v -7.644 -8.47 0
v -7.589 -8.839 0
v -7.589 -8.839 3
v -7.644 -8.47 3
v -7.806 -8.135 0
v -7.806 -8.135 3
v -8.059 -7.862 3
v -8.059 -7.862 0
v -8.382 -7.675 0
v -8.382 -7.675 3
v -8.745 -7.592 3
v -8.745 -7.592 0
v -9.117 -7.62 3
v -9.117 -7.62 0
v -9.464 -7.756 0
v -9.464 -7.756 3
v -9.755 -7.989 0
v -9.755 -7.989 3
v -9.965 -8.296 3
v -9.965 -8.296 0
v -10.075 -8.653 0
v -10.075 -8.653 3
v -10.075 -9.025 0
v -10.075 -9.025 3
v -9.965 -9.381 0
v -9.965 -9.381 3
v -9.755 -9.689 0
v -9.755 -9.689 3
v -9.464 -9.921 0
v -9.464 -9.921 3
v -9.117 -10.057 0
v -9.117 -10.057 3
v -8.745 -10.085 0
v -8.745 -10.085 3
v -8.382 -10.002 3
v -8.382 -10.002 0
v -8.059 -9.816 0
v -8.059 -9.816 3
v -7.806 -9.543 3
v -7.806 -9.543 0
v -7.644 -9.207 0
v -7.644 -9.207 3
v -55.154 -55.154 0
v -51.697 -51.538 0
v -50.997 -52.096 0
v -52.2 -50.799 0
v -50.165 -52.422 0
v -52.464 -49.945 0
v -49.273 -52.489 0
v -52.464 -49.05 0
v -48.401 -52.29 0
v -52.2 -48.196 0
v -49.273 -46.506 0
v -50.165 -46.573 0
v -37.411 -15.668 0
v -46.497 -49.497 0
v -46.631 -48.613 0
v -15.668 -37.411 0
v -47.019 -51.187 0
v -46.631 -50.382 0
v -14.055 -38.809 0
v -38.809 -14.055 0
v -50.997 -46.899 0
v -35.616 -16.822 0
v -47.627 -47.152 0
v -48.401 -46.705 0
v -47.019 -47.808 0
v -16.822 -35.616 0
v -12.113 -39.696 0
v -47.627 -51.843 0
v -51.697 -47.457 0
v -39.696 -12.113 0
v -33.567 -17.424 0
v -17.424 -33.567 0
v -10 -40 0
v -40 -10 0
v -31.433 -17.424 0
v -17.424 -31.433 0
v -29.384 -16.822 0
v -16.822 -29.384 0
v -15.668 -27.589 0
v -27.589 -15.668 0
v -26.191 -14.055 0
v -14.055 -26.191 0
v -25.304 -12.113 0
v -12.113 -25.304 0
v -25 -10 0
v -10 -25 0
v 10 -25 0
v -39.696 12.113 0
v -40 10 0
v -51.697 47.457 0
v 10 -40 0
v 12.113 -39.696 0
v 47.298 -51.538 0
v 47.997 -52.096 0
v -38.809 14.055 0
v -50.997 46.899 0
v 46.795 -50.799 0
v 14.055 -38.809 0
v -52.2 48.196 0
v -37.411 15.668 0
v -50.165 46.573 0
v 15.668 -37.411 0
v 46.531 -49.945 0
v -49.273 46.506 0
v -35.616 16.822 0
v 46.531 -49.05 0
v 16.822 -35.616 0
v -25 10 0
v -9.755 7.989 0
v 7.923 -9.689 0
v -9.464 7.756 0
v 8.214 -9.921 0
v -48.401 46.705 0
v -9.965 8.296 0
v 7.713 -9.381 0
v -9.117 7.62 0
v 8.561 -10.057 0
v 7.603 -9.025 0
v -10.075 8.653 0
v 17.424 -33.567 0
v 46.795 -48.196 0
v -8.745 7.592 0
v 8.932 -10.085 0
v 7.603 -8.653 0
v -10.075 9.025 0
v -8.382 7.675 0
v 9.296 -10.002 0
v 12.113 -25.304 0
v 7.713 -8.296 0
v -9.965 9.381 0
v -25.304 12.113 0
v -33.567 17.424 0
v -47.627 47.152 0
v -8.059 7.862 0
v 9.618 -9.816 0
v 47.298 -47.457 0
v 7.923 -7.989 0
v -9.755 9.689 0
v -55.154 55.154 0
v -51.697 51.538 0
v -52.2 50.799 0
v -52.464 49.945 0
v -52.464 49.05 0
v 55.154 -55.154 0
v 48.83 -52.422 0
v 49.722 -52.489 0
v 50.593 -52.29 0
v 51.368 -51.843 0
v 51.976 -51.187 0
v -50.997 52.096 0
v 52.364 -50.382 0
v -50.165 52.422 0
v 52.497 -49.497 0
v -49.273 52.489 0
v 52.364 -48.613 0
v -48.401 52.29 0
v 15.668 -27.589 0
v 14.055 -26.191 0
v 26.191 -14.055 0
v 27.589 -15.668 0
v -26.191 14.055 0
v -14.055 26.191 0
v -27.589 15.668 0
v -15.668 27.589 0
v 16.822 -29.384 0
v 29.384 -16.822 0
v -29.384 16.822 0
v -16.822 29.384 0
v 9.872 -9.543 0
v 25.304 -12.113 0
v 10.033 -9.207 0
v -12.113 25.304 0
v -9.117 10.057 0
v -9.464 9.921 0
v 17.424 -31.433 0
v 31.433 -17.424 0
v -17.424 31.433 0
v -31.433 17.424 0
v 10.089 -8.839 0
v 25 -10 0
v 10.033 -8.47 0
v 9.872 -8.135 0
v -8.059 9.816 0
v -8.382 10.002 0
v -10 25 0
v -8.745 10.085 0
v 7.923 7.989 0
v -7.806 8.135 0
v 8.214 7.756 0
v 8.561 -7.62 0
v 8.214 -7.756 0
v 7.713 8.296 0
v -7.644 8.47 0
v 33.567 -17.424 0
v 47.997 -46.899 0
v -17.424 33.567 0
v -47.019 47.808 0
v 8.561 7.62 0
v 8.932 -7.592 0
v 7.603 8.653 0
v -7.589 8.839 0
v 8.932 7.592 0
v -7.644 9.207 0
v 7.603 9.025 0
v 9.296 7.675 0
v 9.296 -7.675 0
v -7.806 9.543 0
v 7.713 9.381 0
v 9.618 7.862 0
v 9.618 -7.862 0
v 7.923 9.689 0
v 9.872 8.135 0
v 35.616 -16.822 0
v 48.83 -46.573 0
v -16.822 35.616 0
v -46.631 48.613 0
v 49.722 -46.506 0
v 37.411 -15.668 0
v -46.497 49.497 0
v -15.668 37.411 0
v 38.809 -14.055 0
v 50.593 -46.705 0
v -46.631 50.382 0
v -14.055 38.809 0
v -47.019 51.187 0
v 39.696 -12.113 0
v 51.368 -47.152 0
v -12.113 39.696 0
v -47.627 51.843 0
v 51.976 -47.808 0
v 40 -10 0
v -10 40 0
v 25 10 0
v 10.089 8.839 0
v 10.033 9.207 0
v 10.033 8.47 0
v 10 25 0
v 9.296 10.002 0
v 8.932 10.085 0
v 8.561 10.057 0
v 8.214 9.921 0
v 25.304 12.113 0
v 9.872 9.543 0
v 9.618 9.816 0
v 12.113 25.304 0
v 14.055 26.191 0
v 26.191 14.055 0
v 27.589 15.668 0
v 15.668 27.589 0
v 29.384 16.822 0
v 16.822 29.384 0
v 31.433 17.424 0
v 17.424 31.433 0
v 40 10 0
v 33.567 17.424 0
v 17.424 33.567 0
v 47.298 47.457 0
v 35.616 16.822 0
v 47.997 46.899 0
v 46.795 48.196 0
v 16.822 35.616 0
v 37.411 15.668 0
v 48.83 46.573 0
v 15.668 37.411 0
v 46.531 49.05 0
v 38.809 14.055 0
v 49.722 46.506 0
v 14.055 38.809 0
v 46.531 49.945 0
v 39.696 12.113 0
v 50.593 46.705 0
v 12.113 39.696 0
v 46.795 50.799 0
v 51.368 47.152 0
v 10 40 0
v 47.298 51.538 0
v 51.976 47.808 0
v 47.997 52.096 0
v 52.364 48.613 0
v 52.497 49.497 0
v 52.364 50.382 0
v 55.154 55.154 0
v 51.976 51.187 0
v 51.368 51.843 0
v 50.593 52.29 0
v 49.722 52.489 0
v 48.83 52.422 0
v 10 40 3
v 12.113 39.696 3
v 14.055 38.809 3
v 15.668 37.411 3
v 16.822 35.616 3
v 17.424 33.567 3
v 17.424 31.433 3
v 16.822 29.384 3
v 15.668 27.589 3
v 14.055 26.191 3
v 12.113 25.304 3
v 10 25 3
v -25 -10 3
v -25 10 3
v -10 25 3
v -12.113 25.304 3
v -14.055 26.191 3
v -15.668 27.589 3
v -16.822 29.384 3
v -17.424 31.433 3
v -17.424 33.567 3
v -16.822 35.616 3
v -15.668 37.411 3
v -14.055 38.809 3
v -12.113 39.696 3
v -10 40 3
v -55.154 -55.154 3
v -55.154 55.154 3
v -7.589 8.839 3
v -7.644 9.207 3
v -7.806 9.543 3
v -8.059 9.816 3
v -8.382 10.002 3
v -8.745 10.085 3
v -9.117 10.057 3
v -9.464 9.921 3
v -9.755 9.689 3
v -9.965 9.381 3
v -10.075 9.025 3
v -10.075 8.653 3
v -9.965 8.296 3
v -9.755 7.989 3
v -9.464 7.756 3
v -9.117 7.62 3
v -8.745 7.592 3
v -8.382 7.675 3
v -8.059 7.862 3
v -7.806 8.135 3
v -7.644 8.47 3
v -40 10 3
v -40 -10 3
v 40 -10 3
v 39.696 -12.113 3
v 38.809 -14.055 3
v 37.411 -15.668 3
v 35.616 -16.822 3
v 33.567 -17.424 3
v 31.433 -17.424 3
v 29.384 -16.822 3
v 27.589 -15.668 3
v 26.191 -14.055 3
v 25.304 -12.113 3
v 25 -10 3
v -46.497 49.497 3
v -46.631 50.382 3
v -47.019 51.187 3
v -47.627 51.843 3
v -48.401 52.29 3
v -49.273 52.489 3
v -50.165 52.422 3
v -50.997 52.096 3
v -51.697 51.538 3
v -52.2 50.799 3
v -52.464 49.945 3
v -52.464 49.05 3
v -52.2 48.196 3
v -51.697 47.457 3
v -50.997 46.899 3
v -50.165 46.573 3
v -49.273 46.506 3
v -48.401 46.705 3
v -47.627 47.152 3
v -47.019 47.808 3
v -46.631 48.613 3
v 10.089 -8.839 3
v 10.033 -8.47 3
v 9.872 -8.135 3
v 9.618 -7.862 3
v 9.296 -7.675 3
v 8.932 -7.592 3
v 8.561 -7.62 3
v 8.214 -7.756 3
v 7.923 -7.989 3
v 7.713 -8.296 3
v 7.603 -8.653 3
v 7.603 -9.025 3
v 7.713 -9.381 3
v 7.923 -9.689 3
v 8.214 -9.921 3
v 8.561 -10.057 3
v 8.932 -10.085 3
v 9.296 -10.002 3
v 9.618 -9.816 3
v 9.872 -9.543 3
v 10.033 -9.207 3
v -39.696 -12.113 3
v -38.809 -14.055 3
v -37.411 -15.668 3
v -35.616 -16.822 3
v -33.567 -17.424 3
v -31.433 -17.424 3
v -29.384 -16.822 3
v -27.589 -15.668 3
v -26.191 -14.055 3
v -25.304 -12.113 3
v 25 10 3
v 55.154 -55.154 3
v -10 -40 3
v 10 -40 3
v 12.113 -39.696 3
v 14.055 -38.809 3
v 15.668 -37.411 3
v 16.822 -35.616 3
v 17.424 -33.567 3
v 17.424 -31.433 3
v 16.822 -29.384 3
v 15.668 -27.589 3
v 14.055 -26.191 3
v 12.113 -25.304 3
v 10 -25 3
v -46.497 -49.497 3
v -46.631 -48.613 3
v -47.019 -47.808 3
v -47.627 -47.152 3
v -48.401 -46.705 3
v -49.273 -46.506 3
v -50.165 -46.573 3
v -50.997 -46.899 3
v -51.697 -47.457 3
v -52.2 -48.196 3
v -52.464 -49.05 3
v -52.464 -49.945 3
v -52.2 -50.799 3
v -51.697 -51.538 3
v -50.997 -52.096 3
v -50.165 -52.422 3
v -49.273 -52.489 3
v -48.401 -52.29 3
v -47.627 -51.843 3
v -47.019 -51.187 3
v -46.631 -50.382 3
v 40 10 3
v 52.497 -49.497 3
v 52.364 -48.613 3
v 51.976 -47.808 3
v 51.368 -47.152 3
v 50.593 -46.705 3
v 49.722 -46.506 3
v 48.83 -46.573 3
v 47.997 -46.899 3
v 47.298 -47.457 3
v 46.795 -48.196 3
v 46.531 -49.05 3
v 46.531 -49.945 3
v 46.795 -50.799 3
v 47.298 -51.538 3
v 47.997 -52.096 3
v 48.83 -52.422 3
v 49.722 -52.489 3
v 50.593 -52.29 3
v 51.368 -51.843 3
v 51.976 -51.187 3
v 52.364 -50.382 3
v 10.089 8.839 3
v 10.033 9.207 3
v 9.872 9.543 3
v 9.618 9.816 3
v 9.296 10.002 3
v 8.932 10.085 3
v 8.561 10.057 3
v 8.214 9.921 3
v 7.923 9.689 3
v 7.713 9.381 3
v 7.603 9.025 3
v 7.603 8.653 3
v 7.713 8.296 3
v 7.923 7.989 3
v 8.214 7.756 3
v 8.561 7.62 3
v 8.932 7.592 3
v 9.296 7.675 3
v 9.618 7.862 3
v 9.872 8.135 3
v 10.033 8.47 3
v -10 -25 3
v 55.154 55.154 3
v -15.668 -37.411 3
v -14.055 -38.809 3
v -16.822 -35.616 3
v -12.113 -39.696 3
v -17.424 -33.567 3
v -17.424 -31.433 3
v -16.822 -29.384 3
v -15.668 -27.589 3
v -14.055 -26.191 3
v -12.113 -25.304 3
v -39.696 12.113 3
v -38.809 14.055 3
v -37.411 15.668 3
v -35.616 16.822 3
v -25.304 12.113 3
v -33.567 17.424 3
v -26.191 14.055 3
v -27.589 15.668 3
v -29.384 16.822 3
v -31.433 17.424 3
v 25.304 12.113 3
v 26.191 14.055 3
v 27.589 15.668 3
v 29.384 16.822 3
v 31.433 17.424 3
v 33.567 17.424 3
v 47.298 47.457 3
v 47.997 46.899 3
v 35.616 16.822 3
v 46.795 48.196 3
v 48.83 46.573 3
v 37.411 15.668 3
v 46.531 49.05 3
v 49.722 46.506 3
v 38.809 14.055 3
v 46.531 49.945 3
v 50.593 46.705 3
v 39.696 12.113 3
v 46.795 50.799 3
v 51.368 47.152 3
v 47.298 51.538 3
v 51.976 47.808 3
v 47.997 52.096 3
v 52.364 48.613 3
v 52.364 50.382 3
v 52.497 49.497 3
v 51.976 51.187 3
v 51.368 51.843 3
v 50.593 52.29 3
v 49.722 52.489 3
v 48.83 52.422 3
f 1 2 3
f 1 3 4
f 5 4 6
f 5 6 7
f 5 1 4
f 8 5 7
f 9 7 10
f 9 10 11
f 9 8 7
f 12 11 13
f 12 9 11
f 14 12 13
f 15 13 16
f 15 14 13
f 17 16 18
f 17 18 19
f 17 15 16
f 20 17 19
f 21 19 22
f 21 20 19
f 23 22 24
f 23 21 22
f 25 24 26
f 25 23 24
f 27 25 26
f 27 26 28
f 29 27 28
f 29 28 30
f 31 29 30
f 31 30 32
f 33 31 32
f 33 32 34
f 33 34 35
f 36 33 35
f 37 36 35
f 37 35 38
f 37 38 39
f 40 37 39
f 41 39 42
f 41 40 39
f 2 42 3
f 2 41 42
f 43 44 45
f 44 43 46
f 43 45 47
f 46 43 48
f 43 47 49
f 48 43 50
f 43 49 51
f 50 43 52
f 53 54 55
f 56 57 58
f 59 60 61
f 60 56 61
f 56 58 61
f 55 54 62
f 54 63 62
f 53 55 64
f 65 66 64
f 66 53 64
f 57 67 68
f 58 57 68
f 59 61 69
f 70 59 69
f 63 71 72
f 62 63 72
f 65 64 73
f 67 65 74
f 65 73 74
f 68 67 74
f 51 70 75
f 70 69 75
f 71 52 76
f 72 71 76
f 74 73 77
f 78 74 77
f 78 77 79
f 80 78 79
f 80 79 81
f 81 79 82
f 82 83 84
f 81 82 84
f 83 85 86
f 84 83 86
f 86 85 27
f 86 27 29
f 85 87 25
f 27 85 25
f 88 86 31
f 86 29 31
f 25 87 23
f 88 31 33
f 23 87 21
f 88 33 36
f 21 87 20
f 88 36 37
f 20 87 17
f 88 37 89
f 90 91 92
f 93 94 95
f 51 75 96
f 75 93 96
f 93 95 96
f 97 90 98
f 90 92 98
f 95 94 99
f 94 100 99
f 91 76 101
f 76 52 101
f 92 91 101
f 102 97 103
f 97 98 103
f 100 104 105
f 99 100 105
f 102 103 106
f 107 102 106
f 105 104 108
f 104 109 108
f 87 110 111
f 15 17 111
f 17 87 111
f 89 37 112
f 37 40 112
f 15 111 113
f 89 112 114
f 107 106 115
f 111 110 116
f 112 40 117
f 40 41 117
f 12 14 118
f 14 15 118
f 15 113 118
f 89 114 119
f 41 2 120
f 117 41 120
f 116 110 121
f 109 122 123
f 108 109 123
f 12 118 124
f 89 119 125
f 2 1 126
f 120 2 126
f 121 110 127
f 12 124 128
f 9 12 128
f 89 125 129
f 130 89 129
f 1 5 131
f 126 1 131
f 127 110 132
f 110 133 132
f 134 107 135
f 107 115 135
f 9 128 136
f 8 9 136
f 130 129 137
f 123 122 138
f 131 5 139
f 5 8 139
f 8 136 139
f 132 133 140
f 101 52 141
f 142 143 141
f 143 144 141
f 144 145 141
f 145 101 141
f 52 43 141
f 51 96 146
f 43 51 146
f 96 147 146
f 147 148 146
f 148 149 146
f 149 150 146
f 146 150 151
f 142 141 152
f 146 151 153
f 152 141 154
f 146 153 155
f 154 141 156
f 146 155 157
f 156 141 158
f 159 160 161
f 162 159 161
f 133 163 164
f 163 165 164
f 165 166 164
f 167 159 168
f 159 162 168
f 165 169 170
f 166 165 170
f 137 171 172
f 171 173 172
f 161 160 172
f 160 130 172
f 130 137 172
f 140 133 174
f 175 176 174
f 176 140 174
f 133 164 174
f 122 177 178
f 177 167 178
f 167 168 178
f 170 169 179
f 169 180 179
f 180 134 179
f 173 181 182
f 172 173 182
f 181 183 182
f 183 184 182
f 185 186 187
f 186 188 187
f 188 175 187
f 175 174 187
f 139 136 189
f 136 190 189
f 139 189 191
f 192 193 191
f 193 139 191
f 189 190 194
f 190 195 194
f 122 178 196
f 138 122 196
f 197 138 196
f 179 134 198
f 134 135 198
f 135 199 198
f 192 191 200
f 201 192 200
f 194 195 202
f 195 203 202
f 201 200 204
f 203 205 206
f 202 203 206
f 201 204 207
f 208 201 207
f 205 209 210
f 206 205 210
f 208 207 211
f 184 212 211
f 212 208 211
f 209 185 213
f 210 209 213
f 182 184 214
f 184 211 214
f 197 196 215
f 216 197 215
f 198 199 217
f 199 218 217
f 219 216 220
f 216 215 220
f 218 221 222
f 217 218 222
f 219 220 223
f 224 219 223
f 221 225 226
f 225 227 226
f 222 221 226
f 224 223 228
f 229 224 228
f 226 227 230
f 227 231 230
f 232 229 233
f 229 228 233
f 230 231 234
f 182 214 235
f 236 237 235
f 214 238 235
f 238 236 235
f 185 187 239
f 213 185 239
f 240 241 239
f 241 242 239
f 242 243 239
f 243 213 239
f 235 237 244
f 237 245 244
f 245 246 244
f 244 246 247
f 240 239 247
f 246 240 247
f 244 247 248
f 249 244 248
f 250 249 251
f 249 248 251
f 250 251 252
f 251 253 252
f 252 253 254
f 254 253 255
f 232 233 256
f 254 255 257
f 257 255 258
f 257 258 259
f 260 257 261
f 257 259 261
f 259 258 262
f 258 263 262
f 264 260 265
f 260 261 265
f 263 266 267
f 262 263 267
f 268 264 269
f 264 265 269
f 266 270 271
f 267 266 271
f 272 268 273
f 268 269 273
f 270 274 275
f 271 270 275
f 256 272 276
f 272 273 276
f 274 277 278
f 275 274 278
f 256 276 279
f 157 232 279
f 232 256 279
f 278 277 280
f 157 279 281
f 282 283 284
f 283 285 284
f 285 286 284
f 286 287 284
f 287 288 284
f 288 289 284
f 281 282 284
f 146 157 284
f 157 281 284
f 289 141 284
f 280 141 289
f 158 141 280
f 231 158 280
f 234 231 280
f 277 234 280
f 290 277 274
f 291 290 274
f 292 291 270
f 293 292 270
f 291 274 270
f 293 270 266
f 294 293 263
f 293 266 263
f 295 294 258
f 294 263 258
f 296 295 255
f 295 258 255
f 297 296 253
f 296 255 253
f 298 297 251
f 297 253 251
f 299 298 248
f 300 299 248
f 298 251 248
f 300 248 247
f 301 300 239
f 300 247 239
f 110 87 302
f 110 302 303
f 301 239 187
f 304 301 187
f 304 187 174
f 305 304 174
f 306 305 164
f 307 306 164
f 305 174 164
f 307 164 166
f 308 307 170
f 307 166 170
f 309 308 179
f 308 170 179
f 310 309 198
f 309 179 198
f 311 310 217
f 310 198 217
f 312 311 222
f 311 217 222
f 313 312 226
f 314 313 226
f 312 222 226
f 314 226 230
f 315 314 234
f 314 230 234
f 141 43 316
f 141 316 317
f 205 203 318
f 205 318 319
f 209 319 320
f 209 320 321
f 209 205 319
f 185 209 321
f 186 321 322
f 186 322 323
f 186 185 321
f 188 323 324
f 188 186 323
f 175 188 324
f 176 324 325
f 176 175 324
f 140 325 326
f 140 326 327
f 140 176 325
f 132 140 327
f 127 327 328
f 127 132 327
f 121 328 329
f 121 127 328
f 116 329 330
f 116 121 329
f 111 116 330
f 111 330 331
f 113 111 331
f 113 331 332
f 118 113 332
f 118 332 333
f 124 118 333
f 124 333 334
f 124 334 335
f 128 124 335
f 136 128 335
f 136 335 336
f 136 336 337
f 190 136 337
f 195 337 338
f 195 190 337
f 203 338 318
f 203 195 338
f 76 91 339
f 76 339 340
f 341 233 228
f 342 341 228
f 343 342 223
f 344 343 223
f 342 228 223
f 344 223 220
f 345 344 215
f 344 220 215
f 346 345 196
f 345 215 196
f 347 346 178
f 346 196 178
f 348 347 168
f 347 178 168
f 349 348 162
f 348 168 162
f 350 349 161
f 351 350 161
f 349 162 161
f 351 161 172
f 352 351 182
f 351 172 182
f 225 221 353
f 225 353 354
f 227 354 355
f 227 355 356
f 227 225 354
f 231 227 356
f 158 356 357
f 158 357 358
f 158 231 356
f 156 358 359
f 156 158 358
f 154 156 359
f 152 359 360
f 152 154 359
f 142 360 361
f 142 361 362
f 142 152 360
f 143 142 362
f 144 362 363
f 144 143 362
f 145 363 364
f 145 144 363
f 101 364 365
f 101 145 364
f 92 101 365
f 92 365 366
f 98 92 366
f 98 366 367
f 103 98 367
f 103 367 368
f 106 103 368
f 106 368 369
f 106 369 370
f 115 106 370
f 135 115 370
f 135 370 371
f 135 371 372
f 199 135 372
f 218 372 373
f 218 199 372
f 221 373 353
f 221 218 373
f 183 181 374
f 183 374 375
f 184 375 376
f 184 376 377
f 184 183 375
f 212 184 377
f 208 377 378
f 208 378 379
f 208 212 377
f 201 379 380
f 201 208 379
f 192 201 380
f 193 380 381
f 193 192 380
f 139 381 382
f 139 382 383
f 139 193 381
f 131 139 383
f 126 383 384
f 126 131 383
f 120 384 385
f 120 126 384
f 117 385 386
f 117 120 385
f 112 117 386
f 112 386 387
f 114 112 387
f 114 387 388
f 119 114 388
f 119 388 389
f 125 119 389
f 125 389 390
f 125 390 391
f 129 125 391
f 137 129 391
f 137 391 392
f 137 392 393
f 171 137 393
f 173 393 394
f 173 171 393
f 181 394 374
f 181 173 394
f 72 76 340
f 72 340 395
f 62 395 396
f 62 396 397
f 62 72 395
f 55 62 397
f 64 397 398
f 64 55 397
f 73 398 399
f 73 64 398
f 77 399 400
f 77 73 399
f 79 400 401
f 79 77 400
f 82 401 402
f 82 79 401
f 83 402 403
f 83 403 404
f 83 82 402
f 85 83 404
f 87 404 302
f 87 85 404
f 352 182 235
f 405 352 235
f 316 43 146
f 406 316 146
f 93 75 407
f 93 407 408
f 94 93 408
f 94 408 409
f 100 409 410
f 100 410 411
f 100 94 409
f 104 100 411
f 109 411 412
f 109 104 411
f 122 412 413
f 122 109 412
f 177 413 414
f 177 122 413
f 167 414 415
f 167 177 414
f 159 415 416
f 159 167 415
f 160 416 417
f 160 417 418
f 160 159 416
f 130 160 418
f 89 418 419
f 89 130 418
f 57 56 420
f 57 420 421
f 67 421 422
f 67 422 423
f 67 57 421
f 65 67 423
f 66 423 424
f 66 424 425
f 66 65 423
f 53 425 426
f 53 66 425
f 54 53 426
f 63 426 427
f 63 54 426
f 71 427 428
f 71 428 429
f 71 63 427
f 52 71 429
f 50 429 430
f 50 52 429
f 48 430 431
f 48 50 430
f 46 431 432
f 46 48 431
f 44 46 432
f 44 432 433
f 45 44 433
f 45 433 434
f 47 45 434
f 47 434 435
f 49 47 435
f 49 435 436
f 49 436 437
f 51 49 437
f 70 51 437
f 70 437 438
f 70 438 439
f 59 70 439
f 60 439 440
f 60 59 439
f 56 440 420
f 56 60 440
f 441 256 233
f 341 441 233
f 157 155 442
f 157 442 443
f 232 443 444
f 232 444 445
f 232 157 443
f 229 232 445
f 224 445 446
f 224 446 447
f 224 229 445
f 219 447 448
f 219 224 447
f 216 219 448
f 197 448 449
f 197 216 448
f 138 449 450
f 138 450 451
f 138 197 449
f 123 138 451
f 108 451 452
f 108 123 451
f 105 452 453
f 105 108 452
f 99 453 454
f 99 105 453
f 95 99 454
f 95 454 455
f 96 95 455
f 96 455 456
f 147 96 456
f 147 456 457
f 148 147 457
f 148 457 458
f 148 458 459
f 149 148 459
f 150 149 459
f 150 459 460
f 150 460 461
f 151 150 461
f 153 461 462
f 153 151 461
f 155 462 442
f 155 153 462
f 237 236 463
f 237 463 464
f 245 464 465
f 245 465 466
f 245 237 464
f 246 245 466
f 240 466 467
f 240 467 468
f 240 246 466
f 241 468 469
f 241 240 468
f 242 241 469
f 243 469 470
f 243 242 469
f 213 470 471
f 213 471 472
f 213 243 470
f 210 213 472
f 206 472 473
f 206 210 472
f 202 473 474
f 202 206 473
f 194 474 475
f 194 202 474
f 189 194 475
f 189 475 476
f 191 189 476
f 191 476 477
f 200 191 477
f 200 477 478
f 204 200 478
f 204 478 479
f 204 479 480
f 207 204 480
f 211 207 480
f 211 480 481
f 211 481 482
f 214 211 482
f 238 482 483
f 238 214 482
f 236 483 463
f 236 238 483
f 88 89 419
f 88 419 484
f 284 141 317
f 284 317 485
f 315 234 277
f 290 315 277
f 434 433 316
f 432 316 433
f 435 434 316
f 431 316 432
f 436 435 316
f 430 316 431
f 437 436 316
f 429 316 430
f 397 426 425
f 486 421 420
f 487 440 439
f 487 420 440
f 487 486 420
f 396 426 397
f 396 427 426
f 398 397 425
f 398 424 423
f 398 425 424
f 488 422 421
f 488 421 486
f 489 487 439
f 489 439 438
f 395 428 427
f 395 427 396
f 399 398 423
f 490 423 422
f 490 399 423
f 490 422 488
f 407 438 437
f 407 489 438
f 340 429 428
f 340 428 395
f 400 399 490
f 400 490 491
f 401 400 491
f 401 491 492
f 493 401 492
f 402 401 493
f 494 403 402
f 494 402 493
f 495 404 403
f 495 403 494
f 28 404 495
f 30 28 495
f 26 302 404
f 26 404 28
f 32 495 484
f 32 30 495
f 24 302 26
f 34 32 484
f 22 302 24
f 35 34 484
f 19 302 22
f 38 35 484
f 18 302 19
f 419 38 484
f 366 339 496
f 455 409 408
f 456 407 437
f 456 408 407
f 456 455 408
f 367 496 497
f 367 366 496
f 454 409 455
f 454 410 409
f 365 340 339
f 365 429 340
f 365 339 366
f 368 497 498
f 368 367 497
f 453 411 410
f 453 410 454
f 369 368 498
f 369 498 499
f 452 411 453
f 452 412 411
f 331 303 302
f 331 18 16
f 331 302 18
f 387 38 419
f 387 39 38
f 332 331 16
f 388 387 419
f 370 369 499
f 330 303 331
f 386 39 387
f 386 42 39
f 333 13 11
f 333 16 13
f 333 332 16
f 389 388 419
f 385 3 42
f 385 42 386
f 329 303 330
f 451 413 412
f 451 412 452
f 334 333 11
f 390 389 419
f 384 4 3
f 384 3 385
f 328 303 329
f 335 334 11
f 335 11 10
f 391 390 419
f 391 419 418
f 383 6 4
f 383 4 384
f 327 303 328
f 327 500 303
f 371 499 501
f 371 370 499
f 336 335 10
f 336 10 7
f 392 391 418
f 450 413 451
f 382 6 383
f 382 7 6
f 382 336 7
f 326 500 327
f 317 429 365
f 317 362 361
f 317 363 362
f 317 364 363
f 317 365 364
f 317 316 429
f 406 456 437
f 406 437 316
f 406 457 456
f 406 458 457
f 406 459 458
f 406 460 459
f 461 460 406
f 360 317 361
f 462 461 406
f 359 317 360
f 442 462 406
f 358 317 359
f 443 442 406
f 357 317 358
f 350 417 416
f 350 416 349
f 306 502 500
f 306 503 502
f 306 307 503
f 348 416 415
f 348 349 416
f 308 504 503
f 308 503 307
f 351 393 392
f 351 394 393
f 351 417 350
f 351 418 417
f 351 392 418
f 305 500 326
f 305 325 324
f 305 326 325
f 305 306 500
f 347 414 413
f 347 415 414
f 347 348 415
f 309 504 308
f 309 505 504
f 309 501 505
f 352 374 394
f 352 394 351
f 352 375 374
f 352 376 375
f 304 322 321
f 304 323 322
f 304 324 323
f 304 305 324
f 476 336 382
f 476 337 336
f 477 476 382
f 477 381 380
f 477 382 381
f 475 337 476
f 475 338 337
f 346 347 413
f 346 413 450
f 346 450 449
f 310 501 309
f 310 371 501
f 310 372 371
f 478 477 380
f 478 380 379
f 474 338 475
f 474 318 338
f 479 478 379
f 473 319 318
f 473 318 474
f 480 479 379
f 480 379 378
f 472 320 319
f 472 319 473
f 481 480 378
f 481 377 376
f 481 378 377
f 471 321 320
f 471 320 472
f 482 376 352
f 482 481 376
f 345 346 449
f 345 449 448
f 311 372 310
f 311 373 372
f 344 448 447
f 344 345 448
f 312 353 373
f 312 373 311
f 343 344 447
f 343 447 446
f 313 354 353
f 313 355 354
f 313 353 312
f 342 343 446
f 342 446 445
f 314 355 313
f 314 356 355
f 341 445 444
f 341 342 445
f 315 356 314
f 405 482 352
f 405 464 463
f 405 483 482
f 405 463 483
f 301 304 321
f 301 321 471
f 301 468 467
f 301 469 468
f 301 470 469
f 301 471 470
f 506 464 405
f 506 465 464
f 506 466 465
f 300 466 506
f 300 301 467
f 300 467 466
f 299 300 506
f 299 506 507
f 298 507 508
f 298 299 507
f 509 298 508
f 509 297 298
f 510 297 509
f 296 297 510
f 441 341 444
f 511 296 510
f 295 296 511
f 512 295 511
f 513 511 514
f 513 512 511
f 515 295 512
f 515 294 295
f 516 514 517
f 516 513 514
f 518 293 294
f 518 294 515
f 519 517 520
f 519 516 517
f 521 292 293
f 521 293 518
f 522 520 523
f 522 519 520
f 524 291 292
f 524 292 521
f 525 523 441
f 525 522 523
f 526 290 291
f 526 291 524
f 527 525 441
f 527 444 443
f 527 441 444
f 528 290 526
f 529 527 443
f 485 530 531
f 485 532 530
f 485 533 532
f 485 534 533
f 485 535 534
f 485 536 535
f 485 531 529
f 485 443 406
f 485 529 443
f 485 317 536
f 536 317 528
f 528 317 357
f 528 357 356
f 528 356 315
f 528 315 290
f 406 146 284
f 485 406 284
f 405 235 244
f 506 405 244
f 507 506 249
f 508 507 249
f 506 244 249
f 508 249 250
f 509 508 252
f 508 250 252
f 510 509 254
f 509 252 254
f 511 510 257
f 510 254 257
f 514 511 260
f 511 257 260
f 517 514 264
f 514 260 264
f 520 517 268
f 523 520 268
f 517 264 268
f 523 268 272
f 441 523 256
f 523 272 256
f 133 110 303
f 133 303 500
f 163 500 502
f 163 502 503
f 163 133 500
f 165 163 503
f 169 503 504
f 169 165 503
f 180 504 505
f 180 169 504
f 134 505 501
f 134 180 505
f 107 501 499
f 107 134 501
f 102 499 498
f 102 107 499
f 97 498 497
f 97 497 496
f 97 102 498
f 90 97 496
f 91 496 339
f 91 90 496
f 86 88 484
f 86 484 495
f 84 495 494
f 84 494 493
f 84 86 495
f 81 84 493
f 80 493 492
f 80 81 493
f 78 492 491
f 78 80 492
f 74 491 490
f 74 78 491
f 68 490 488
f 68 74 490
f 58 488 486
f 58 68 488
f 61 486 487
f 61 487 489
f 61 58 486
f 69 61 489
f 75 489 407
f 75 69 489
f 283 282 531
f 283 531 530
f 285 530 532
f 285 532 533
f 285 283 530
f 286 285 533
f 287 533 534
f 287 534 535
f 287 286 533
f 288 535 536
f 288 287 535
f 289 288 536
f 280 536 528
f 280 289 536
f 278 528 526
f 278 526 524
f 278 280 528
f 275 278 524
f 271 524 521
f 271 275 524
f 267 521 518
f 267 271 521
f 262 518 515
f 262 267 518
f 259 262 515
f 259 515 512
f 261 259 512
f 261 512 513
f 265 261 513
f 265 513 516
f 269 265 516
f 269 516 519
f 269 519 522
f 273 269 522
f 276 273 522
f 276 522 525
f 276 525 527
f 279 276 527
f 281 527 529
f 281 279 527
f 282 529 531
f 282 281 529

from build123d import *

# Parameters (mm, degrees)
CROQUIS3_W              = 110.308657866
CROQUIS3_H              = 110.308657866
CROQUIS3_R              = 1.25
CROQUIS3_R_2            = 3
SALIENTE_EXTRUIR1_DEPTH = 3


with BuildPart() as part:
    # Croquis3 → Saliente-Extruir1 (new body)
    with BuildSketch(Plane.XY):
        Rectangle(CROQUIS3_W, CROQUIS3_H)
        with Locations((-8.838834765, 8.838834765)):
            Circle(CROQUIS3_R, mode=Mode.SUBTRACT)
        with Locations((8.838834765, 8.838834765)):
            Circle(CROQUIS3_R, mode=Mode.SUBTRACT)
        with Locations((8.838834765, -8.838834765)):
            Circle(CROQUIS3_R, mode=Mode.SUBTRACT)
        with Locations((-8.838834765, -8.838834765)):
            Circle(CROQUIS3_R, mode=Mode.SUBTRACT)
        with Locations((-49.497474683, 49.497474683)):
            Circle(CROQUIS3_R_2, mode=Mode.SUBTRACT)
        with Locations((49.497474683, 49.497474683)):
            Circle(CROQUIS3_R_2, mode=Mode.SUBTRACT)
        with Locations((49.497474683, -49.497474683)):
            Circle(CROQUIS3_R_2, mode=Mode.SUBTRACT)
        with Locations((-49.497474683, -49.497474683)):
            Circle(CROQUIS3_R_2, mode=Mode.SUBTRACT)
        with BuildLine():
            Line((25, -10), (25, 10))
            ThreePointArc((25, 10), (32.5, 17.5), (40, 10))
            Line((40, 10), (40, -10))
            ThreePointArc((40, -10), (32.5, -17.5), (25, -10))
        make_face(mode=Mode.SUBTRACT)
        with BuildLine():
            Line((-25, -10), (-25, 10))
            ThreePointArc((-25, 10), (-32.5, 17.5), (-40, 10))
            Line((-40, 10), (-40, -10))
            ThreePointArc((-40, -10), (-32.5, -17.5), (-25, -10))
        make_face(mode=Mode.SUBTRACT)
        with BuildLine():
            Line((-10, 40), (10, 40))
            ThreePointArc((10, 40), (17.5, 32.5), (10, 25))
            Line((10, 25), (-10, 25))
            ThreePointArc((-10, 25), (-17.5, 32.5), (-10, 40))
        make_face(mode=Mode.SUBTRACT)
        with BuildLine():
            Line((-10, -40), (10, -40))
            ThreePointArc((10, -40), (17.5, -32.5), (10, -25))
            Line((10, -25), (-10, -25))
            ThreePointArc((-10, -25), (-17.5, -32.5), (-10, -40))
        make_face(mode=Mode.SUBTRACT)
    extrude(amount=SALIENTE_EXTRUIR1_DEPTH)


solid = part.part
